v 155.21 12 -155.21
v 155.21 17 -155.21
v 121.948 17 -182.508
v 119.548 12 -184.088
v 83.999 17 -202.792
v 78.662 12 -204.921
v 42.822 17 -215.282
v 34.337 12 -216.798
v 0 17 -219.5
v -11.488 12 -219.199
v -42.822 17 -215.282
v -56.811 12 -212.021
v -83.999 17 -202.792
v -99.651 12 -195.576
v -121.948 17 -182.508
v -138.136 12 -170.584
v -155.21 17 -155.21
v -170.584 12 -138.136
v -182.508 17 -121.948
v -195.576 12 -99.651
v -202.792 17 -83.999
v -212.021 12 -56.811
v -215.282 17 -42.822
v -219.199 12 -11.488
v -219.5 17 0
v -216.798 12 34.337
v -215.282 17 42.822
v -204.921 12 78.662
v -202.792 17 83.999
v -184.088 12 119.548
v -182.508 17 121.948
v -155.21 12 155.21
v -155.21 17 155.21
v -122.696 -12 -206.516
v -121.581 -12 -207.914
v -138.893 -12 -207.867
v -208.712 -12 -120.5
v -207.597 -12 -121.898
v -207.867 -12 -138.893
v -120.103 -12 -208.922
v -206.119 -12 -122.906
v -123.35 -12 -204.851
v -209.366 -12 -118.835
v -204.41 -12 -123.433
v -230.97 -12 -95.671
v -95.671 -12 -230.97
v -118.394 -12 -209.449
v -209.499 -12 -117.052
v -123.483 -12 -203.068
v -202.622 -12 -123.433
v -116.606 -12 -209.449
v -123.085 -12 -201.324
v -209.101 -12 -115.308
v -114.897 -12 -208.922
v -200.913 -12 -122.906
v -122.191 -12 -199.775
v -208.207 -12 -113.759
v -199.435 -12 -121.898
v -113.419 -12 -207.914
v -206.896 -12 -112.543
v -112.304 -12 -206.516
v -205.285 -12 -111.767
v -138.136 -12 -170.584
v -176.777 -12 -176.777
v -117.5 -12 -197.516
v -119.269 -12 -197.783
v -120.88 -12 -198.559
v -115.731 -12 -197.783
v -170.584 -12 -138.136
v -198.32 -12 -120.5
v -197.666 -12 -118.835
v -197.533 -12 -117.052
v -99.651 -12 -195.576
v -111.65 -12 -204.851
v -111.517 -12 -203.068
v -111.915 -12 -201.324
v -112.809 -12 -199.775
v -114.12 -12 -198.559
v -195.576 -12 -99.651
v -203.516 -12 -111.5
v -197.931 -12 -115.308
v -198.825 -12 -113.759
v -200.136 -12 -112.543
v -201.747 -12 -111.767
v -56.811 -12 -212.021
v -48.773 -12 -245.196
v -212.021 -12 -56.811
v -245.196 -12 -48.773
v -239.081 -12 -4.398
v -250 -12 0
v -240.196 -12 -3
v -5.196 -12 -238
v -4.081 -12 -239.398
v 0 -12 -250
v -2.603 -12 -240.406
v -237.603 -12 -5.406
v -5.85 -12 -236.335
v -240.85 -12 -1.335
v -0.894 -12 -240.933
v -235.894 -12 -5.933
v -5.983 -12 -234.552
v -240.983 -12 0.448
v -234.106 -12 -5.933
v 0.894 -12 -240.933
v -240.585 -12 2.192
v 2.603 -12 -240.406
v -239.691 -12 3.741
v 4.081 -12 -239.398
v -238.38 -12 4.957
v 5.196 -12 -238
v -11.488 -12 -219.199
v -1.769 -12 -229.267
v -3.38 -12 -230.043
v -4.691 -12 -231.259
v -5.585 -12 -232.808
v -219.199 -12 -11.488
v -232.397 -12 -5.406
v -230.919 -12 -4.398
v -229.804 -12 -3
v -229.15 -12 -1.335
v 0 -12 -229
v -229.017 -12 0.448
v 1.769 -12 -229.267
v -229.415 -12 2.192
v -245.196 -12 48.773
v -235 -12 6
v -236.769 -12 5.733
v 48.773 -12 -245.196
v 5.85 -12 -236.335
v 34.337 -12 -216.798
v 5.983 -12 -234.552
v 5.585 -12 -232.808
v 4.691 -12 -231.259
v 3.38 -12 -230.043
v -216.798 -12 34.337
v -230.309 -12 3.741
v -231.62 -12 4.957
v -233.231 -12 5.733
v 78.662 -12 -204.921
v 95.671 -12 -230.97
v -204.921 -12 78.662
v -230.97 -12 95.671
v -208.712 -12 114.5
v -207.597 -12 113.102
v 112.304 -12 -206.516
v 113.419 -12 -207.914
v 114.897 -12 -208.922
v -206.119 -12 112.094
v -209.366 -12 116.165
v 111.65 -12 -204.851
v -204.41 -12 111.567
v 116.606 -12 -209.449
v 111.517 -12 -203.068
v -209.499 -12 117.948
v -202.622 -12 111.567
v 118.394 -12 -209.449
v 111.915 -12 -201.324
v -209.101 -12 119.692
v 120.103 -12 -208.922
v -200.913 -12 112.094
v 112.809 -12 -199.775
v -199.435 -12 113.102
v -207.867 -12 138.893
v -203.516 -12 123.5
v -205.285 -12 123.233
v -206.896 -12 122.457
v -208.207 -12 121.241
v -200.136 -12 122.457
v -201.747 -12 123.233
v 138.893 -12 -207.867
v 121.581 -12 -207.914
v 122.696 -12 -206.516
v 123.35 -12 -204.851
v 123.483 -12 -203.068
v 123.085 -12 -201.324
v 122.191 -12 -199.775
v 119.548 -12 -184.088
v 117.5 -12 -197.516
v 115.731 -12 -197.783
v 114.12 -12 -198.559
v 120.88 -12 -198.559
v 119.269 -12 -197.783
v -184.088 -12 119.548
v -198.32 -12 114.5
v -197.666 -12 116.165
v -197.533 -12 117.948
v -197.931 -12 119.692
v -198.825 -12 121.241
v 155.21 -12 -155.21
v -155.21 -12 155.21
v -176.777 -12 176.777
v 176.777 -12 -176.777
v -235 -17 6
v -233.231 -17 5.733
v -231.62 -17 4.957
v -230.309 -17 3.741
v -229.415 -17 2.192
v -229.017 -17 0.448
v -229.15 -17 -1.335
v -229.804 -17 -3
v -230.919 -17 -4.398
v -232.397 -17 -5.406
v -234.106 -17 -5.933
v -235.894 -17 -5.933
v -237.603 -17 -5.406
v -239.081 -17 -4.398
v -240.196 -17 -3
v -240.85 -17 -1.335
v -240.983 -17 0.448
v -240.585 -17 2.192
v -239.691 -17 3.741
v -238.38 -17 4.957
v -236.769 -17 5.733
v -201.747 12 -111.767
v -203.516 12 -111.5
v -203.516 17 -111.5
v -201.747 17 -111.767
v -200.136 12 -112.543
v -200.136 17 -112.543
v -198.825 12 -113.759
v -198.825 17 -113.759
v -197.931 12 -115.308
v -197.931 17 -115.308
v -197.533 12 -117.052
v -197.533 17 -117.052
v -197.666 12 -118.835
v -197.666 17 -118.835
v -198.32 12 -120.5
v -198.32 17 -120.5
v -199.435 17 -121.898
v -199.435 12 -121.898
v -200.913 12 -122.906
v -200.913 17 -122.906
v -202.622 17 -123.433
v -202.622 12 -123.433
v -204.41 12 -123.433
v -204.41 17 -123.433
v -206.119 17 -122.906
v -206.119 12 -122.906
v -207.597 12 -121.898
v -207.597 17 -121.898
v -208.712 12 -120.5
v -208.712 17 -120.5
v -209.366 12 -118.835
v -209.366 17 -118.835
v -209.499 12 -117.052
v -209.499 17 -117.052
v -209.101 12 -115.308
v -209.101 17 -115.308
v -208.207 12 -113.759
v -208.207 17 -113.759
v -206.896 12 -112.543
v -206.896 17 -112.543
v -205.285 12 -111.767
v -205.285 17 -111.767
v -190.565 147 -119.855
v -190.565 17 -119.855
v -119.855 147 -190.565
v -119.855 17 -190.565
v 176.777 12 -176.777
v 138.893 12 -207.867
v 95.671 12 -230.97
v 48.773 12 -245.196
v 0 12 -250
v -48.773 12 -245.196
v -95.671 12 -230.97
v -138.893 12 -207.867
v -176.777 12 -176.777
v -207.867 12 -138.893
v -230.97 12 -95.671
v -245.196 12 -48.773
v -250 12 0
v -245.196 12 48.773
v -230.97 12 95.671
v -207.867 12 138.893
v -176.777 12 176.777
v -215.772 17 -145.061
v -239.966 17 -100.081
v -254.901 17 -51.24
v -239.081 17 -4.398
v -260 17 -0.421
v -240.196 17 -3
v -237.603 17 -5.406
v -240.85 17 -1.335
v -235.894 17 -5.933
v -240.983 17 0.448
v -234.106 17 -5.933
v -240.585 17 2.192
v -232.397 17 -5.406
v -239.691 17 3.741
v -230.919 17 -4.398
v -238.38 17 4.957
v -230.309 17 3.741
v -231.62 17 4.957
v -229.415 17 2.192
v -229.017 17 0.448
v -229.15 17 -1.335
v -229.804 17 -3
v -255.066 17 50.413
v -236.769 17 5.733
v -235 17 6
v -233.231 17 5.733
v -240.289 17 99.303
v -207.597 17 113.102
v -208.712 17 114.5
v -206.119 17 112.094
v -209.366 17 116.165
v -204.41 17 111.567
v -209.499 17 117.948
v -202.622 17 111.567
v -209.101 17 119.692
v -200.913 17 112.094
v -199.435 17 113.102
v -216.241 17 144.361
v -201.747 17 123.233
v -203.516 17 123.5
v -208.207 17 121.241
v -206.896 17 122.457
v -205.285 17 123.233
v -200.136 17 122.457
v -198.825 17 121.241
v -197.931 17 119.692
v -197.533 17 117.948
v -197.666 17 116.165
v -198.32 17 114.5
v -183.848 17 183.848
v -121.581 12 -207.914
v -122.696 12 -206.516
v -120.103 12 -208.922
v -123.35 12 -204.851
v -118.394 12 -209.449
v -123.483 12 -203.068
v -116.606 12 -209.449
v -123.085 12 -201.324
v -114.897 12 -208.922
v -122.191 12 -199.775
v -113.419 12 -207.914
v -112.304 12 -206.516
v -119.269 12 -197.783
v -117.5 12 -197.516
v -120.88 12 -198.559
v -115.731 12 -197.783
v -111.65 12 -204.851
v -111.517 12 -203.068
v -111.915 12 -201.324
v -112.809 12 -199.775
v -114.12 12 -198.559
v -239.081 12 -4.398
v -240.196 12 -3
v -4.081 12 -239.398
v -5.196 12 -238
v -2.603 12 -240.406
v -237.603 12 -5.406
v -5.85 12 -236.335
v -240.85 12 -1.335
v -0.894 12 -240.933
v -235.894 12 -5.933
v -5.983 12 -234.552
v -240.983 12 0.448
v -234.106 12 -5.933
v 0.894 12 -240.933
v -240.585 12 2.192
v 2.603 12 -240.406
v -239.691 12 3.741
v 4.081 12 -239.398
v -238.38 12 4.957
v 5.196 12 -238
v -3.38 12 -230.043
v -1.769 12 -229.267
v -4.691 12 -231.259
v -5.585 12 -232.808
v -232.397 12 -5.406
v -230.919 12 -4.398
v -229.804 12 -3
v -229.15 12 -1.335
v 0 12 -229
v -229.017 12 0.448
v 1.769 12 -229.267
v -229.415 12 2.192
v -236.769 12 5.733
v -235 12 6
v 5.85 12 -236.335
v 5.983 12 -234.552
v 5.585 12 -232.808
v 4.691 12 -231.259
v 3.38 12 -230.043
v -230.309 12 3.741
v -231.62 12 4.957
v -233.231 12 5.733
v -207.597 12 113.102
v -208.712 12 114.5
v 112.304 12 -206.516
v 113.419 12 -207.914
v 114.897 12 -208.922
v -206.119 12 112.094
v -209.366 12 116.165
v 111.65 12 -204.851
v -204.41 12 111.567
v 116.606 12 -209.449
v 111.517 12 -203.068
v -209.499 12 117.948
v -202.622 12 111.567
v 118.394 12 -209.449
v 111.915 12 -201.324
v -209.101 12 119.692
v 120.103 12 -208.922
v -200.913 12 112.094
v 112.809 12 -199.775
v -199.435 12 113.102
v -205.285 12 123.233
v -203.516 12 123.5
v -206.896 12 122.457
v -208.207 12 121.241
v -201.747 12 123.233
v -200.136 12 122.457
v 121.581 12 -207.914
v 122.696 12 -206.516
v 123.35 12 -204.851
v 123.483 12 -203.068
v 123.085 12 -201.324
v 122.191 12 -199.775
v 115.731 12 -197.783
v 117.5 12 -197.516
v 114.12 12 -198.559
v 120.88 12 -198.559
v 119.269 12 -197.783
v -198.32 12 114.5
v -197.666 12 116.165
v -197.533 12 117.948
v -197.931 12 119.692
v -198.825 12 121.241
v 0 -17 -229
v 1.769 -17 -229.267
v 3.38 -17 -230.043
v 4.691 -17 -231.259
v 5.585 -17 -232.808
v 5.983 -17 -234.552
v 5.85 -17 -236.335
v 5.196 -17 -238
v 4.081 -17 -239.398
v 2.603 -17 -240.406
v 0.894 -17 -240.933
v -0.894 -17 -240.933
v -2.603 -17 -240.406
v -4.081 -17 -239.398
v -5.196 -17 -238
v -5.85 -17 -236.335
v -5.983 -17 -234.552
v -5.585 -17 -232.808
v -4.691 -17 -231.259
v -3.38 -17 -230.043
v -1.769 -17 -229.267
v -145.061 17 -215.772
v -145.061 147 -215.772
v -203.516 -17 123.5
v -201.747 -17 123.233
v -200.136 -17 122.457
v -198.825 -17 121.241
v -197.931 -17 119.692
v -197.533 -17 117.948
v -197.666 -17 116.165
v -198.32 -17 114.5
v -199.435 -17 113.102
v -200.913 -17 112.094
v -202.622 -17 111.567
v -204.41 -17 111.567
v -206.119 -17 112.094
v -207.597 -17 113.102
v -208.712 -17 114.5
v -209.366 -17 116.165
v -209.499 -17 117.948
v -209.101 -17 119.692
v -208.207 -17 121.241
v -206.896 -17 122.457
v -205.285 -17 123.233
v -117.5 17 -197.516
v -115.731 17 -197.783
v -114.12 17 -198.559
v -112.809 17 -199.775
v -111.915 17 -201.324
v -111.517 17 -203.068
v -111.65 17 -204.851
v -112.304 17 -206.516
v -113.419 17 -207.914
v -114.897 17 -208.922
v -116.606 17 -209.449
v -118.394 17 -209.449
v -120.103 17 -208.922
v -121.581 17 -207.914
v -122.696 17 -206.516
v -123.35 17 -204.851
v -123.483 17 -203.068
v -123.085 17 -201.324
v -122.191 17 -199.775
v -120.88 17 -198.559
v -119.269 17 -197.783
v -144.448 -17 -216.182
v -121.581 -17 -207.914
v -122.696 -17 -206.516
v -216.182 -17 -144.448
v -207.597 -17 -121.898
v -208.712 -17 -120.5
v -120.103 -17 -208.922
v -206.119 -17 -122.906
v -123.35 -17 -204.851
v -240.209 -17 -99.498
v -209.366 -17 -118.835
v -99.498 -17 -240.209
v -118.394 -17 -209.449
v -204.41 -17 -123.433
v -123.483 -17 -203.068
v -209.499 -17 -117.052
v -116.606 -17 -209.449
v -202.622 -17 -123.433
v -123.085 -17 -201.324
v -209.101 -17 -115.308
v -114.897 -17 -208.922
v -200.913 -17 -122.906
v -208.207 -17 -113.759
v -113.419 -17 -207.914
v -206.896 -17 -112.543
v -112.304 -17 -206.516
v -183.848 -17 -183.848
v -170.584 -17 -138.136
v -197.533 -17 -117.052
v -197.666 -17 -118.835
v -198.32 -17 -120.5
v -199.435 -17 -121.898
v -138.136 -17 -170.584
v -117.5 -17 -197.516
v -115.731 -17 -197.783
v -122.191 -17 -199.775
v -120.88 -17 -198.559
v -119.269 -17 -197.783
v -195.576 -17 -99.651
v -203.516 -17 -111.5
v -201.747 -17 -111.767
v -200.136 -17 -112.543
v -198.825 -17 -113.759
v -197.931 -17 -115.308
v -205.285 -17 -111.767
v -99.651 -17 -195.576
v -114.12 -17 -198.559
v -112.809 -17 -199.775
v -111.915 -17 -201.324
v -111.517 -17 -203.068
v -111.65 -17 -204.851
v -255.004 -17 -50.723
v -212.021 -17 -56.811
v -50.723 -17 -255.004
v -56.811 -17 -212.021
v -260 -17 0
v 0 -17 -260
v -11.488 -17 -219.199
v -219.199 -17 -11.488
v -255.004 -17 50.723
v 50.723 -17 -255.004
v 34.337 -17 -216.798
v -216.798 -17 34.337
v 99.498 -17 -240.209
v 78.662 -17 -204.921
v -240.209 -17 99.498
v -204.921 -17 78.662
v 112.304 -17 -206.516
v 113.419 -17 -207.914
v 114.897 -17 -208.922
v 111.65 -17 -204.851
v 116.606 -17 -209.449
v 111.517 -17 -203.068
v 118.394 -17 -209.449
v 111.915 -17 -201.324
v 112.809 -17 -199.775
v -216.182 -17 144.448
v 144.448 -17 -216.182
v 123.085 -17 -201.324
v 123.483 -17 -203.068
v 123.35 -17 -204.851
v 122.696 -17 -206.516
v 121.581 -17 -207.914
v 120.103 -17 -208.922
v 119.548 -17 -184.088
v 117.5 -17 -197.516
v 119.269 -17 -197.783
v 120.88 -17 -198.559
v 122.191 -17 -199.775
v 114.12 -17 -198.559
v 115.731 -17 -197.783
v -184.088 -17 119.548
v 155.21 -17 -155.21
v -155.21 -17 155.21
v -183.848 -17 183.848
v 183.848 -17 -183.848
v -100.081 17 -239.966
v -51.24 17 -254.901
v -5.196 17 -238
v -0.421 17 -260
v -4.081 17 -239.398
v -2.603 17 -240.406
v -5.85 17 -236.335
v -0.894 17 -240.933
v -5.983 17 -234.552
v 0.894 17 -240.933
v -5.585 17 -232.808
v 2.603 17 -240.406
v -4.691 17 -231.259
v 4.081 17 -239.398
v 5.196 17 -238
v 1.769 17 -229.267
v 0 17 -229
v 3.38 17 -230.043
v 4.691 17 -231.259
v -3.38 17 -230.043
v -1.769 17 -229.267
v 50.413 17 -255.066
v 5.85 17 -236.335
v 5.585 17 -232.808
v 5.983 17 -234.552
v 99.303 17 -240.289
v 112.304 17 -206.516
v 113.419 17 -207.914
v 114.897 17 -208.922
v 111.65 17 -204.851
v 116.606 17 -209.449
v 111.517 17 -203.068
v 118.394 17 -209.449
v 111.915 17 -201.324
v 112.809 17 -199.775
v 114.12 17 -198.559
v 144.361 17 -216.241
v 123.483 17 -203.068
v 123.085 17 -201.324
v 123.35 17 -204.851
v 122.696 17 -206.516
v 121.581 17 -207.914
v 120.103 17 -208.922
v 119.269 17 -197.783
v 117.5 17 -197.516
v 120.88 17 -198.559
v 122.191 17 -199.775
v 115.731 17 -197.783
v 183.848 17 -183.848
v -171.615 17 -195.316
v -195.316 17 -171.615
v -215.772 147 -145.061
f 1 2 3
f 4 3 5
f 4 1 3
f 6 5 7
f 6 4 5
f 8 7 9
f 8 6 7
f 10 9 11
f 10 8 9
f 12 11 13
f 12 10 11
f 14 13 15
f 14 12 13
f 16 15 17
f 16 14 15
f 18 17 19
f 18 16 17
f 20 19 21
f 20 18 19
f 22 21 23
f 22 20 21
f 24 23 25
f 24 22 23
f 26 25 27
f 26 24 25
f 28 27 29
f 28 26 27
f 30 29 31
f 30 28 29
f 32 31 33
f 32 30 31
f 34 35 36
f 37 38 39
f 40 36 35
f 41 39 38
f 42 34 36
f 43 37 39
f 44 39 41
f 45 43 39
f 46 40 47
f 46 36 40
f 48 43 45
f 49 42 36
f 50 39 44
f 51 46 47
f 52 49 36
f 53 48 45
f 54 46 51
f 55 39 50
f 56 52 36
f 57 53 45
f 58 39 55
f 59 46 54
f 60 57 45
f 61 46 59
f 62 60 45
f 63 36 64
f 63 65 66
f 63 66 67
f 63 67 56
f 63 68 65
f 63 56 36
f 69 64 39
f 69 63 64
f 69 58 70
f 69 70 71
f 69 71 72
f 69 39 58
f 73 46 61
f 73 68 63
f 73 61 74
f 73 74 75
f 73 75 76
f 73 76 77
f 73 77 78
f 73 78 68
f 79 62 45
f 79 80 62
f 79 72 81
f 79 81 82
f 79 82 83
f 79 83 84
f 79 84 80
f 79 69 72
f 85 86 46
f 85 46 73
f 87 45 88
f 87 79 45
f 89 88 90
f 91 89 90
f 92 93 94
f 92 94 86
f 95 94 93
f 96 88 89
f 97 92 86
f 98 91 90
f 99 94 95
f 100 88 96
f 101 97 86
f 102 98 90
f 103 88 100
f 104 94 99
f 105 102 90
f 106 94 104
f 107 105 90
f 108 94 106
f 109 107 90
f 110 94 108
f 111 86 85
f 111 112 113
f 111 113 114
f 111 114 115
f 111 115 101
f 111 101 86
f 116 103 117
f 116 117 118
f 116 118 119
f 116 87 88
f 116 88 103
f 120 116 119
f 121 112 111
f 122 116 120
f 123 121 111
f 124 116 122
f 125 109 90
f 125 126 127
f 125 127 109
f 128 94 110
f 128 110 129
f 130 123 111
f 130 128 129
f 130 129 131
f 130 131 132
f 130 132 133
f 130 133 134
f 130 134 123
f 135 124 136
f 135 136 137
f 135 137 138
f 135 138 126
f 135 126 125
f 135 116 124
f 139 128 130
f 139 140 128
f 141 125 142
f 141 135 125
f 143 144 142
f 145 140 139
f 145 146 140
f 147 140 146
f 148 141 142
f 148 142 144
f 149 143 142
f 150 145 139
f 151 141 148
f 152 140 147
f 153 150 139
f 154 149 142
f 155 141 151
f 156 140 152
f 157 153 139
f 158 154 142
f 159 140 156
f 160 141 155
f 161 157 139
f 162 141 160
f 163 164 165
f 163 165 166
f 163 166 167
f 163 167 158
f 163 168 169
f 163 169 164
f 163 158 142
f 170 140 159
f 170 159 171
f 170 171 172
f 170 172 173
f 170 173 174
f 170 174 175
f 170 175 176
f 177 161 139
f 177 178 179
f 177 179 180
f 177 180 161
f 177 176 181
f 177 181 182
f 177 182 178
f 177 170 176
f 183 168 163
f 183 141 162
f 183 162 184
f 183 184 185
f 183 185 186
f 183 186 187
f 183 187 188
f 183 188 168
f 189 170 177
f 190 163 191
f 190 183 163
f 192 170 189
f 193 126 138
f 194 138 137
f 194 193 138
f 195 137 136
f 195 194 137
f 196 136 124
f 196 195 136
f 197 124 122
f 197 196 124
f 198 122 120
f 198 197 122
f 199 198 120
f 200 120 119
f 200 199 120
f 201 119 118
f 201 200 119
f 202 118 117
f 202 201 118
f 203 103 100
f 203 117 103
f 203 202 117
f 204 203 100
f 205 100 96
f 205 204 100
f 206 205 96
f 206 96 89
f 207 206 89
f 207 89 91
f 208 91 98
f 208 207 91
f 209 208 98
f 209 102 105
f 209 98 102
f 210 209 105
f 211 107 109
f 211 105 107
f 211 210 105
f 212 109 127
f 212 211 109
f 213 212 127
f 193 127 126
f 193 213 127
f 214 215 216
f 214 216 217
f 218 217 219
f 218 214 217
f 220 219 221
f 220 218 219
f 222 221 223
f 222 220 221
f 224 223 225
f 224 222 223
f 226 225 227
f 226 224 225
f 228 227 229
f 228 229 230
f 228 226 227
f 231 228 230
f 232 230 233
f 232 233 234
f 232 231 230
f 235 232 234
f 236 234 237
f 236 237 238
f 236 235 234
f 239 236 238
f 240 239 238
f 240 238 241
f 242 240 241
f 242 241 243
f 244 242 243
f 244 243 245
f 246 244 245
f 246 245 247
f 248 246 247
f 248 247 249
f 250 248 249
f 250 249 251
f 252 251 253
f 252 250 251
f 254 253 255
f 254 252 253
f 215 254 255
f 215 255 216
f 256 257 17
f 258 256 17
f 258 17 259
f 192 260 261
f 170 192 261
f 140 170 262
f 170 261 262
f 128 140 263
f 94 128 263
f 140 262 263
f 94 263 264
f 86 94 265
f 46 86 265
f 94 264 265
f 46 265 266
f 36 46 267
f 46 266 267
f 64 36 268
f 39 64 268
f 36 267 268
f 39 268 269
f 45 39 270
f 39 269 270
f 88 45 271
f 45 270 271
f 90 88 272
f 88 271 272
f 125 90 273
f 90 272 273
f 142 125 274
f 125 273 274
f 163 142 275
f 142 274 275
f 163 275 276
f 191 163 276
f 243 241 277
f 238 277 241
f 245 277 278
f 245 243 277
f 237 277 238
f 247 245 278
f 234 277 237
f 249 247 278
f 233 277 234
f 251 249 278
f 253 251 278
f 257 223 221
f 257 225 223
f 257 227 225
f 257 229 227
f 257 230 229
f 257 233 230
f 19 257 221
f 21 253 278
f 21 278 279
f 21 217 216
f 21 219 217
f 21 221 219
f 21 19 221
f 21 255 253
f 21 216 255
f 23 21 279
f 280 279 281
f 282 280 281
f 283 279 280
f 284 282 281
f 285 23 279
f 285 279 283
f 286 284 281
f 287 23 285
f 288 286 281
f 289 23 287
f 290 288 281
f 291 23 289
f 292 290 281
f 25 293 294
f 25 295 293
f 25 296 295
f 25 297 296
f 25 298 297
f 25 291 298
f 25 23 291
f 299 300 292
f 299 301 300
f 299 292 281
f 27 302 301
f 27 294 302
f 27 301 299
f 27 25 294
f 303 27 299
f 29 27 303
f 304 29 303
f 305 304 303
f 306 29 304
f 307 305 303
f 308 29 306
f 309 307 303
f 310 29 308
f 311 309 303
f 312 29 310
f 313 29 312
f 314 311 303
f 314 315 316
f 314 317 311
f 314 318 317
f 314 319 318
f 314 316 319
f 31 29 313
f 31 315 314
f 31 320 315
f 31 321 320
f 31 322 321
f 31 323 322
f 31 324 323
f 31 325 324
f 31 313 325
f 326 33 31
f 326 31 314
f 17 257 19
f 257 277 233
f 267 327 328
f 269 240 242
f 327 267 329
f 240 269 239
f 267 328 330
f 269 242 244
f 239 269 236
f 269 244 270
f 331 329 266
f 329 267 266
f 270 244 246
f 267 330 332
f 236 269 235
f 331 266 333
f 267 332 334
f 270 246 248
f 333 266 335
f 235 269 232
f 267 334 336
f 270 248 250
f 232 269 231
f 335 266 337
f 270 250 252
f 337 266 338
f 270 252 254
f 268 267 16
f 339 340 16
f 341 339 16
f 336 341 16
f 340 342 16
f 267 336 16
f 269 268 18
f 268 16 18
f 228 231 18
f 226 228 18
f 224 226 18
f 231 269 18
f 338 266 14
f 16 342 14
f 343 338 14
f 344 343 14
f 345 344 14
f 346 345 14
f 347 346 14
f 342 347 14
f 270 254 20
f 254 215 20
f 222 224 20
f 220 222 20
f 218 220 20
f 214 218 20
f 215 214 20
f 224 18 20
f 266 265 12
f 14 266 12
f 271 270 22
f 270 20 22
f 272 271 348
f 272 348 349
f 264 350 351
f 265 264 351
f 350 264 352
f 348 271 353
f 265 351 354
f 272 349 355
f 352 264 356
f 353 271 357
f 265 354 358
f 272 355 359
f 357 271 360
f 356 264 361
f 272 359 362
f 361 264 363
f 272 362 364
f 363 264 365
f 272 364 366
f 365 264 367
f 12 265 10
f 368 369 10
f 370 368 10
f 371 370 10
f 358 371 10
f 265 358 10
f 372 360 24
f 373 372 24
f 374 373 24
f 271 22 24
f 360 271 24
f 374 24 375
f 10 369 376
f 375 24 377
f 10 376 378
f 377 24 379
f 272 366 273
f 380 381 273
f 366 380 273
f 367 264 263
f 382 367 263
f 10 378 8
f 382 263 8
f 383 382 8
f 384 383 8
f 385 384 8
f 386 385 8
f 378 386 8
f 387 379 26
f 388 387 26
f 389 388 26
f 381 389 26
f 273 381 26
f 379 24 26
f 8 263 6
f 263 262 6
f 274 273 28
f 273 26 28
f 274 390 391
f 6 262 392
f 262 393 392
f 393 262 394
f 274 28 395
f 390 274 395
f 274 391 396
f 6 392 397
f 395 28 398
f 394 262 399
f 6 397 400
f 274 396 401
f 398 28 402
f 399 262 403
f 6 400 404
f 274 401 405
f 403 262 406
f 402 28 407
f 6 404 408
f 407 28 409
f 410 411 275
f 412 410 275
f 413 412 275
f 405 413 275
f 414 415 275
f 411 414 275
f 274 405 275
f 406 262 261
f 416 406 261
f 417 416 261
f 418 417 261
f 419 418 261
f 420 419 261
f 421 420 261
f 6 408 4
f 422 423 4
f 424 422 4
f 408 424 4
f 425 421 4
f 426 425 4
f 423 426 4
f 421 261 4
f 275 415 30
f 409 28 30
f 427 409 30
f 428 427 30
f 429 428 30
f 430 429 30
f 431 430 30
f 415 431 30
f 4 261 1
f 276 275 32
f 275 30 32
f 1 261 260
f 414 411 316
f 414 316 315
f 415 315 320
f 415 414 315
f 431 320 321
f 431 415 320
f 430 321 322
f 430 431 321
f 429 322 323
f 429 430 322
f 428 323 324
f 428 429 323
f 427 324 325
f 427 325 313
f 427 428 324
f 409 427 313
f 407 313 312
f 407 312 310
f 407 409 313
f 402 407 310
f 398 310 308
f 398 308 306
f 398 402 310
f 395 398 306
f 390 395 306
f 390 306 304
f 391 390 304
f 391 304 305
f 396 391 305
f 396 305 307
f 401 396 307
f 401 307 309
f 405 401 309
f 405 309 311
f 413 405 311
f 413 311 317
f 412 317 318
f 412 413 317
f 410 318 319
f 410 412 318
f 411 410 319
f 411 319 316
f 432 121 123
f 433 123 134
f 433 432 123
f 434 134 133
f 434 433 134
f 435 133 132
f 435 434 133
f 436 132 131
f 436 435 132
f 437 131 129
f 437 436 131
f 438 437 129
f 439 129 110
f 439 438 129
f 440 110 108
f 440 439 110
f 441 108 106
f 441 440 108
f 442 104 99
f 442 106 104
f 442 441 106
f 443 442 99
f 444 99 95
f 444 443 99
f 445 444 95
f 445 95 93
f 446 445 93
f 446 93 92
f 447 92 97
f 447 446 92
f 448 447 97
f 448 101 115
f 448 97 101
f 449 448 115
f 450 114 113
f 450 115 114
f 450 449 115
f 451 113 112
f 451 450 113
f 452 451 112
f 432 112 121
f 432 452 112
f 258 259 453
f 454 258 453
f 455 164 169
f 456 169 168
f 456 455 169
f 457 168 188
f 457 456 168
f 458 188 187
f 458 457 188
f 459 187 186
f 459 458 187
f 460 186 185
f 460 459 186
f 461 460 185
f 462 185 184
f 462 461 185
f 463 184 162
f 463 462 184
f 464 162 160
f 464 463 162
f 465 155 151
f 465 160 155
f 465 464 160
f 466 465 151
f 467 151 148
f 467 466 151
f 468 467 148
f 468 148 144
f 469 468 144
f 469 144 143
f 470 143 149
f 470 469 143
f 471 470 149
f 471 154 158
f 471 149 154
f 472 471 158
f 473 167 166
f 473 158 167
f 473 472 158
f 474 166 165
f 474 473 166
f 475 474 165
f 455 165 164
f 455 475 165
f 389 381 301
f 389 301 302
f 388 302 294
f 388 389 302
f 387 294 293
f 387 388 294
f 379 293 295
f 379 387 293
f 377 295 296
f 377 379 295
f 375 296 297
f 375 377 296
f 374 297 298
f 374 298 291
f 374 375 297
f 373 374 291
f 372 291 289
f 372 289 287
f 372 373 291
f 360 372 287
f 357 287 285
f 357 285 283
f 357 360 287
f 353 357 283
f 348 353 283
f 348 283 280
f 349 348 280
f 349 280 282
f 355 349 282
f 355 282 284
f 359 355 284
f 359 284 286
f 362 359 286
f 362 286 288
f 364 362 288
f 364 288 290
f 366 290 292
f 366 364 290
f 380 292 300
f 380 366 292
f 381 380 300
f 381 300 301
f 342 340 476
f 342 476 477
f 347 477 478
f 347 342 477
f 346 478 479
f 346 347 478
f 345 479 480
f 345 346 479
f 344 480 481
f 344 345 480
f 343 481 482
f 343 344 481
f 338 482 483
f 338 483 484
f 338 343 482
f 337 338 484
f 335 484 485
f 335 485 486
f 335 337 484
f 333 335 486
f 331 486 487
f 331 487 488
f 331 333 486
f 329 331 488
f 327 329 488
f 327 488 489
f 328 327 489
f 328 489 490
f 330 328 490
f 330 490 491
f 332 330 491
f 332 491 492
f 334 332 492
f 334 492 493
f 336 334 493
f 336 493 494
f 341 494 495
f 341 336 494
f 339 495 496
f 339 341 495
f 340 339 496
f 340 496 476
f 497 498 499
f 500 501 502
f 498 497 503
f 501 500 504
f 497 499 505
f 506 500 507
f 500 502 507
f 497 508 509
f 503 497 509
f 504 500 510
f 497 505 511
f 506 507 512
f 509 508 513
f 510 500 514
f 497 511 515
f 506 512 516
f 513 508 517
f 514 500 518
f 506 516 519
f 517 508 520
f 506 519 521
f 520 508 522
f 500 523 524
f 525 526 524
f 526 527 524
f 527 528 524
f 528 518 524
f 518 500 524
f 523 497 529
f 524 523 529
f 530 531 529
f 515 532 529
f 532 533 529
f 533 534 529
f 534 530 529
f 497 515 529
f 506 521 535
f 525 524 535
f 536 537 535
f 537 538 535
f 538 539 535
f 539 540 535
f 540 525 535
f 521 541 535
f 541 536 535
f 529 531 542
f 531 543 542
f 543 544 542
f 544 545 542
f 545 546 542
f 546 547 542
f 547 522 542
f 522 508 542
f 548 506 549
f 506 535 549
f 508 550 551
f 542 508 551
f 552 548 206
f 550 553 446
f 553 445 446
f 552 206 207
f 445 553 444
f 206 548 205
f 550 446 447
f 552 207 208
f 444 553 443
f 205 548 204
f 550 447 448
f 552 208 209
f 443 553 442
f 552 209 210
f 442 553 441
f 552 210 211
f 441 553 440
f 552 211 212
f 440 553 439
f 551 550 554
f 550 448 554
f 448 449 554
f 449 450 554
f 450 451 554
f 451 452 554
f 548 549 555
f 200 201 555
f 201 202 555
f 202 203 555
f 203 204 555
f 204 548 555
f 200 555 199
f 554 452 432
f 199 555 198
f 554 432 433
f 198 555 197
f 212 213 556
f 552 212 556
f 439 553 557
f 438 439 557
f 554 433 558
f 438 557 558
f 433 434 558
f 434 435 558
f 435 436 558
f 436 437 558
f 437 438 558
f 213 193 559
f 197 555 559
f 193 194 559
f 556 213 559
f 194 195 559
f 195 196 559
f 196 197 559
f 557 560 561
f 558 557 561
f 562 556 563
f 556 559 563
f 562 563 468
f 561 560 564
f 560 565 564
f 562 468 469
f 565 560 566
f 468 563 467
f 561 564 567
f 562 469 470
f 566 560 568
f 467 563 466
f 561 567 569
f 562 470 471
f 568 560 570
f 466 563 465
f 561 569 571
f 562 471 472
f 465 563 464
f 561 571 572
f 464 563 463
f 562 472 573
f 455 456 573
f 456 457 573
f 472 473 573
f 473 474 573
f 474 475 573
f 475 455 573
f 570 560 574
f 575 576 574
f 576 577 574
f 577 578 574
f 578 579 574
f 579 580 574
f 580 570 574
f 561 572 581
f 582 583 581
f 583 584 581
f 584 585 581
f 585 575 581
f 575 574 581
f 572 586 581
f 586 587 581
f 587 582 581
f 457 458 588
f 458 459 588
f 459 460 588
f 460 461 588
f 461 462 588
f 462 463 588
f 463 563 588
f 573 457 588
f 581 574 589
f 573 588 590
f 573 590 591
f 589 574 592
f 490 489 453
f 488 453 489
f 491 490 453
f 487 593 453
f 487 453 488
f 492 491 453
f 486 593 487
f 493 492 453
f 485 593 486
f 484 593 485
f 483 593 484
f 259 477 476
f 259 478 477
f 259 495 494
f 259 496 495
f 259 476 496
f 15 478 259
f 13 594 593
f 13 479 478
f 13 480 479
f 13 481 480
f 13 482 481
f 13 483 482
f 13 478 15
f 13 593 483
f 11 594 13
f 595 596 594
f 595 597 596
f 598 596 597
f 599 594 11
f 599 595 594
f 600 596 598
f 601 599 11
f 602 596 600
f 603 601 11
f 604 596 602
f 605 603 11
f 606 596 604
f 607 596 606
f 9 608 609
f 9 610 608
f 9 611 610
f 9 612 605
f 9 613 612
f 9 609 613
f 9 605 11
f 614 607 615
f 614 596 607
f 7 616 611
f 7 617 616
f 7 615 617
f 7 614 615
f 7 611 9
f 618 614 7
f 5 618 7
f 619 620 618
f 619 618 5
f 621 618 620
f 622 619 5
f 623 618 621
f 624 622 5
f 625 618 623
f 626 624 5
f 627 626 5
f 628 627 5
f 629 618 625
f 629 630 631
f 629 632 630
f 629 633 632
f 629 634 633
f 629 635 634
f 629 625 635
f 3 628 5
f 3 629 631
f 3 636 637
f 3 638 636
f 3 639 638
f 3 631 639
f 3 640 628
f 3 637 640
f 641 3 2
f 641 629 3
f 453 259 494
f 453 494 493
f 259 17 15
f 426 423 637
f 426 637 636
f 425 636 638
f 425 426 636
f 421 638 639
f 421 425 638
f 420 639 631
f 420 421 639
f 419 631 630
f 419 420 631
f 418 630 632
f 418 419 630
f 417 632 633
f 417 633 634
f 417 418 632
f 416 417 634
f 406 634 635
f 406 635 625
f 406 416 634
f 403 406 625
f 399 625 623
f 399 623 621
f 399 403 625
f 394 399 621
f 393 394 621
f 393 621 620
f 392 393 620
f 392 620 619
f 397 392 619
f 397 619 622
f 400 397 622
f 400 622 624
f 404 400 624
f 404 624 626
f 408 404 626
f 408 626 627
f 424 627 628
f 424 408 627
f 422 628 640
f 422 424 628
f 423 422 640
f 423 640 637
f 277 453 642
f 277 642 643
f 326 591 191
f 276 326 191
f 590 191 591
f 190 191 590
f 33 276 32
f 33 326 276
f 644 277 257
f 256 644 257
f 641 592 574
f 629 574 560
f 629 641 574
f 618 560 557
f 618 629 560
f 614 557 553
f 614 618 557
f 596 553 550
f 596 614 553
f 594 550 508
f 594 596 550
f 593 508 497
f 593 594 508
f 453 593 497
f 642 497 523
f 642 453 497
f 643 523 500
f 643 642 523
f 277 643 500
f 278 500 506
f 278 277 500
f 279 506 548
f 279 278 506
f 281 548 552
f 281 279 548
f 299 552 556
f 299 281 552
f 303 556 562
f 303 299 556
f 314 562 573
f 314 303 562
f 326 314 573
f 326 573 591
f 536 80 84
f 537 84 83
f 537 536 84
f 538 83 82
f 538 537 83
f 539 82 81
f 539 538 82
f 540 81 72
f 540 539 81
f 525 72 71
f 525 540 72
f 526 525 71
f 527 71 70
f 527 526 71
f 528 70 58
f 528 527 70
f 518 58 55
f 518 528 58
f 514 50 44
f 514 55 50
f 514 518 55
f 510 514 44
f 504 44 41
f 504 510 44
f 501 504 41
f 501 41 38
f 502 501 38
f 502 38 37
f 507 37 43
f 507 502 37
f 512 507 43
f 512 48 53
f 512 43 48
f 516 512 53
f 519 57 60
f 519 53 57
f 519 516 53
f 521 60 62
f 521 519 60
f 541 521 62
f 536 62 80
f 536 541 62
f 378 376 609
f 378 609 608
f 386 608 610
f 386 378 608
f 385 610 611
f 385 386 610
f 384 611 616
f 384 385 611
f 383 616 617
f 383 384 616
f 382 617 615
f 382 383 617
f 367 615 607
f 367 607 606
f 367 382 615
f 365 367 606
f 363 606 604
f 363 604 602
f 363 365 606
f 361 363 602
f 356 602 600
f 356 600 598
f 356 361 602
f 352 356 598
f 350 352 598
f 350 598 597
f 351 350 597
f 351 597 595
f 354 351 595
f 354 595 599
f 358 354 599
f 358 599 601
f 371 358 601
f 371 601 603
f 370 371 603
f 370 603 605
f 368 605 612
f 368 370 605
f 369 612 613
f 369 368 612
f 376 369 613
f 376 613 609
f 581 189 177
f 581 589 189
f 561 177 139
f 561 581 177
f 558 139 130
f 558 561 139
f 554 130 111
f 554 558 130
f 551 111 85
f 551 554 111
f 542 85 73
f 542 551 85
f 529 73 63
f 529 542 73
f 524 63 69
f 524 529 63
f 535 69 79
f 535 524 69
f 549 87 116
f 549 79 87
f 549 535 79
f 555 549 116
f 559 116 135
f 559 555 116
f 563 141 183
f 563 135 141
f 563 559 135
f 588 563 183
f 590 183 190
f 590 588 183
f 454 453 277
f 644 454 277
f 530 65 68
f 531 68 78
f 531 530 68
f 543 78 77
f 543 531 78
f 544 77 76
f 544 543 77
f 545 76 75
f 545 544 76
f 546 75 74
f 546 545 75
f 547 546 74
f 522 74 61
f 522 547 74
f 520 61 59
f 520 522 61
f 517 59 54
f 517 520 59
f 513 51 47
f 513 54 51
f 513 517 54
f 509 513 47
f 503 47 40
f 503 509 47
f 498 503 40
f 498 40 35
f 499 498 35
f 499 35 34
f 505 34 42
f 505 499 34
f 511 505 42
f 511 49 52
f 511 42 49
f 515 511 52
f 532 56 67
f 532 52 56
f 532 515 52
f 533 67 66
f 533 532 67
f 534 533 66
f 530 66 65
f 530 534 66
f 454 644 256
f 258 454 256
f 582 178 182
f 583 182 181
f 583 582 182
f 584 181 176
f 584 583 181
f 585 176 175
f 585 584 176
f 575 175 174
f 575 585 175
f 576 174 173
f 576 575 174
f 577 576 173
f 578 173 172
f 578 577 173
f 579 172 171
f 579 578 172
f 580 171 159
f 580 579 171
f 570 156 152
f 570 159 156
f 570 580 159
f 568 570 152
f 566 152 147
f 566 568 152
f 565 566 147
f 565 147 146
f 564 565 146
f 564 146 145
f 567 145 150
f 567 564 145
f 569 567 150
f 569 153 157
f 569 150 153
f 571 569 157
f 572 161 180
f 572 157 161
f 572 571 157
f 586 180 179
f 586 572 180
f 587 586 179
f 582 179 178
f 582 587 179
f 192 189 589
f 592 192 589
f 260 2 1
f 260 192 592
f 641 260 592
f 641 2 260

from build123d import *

# Parameters (mm, degrees)
SKETCH1_R           = 260
SKETCH1_R_2         = 6
SKETCH1_R_3         = 219.5
BOSS_EXTRUDE1_DEPTH = 17
SKETCH2_R           = 250
CUT_EXTRUDE1_DEPTH  = 12
CUT_EXTRUDE2_DEPTH  = 370.264133108
BOSS_EXTRUDE2_DEPTH = 130


with BuildPart() as part:
    # Sketch1 → Boss-Extrude1 (new, symmetric)
    with BuildSketch(Plane(origin=(0, 0, 0), x_dir=(1, 0, 0), z_dir=(0, 1, 0))):
        with Locations(Location((0, 0, 0), (0, 0, 270))):
            Circle(SKETCH1_R)
        with Locations(Location((-117.5, 203.515969889, 0), (0, 0, 270))):
            Circle(SKETCH1_R_2, mode=Mode.SUBTRACT)
        with Locations(Location((-203.515969889, 117.5, 0), (0, 0, 270))):
            Circle(SKETCH1_R_2, mode=Mode.SUBTRACT)
        with Locations(Location((-235, 0, 0), (0, 0, 270))):
            Circle(SKETCH1_R_2, mode=Mode.SUBTRACT)
        with Locations(Location((-203.515969889, -117.5, 0), (0, 0, 270))):
            Circle(SKETCH1_R_2, mode=Mode.SUBTRACT)
        with Locations(Location((-117.5, -203.515969889, 0), (0, 0, 270))):
            Circle(SKETCH1_R_2, mode=Mode.SUBTRACT)
        with Locations(Location((0, -235, 0), (0, 0, 270))):
            Circle(SKETCH1_R_2, mode=Mode.SUBTRACT)
        with Locations(Location((117.5, -203.515969889, 0), (0, 0, 270))):
            Circle(SKETCH1_R_2, mode=Mode.SUBTRACT)
        with Locations(Location((203.515969889, -117.5, 0), (0, 0, 270))):
            Circle(SKETCH1_R_2, mode=Mode.SUBTRACT)
        with Locations(Location((235, 0, 0), (0, 0, 270))):
            Circle(SKETCH1_R_2, mode=Mode.SUBTRACT)
        with Locations(Location((203.515969889, 117.5, 0), (0, 0, 270))):
            Circle(SKETCH1_R_2, mode=Mode.SUBTRACT)
        with Locations(Location((117.5, 203.515969889, 0), (0, 0, 270))):
            Circle(SKETCH1_R_2, mode=Mode.SUBTRACT)
        with Locations(Location((0, 235, 0), (0, 0, 270))):
            Circle(SKETCH1_R_2, mode=Mode.SUBTRACT)
        with Locations(Location((0, 0, 0), (0, 0, 270))):
            Circle(SKETCH1_R_3, mode=Mode.SUBTRACT)
    extrude(amount=BOSS_EXTRUDE1_DEPTH, both=True)

    # Sketch2 → Cut-Extrude1 (cut, symmetric)
    with BuildSketch(Plane(origin=(0, 0, 0), x_dir=(1, 0, 0), z_dir=(0, 1, 0))):
        with Locations(Location((0, 0, 0), (0, 0, 270))):
            Circle(SKETCH2_R)
    extrude(amount=CUT_EXTRUDE1_DEPTH, both=True, mode=Mode.SUBTRACT)

    # Sketch3 → Cut-Extrude2 (cut, through all)
    with BuildSketch(Plane(origin=(0, 17, 0), x_dir=(1, 0, 0), z_dir=(0, 1, 0))):
        Polygon((-183.847763109, -183.847763109), (183.847763109, 183.847763109), (370.704407613, -3.008881396), (3.008881396, -370.704407613), align=None)
    extrude(amount=-CUT_EXTRUDE2_DEPTH, mode=Mode.SUBTRACT)

    # Sketch4 → Boss-Extrude2 (add)
    with BuildSketch(Plane(origin=(0, 17, 0), x_dir=(1, 0, 0), z_dir=(0, 1, 0))):
        Polygon((-215.771524586, 145.060846467), (-190.56527753, 119.854599411), (-119.854599411, 190.56527753), (-145.060846467, 215.771524586), align=None)
    extrude(amount=BOSS_EXTRUDE2_DEPTH)


solid = part.part
